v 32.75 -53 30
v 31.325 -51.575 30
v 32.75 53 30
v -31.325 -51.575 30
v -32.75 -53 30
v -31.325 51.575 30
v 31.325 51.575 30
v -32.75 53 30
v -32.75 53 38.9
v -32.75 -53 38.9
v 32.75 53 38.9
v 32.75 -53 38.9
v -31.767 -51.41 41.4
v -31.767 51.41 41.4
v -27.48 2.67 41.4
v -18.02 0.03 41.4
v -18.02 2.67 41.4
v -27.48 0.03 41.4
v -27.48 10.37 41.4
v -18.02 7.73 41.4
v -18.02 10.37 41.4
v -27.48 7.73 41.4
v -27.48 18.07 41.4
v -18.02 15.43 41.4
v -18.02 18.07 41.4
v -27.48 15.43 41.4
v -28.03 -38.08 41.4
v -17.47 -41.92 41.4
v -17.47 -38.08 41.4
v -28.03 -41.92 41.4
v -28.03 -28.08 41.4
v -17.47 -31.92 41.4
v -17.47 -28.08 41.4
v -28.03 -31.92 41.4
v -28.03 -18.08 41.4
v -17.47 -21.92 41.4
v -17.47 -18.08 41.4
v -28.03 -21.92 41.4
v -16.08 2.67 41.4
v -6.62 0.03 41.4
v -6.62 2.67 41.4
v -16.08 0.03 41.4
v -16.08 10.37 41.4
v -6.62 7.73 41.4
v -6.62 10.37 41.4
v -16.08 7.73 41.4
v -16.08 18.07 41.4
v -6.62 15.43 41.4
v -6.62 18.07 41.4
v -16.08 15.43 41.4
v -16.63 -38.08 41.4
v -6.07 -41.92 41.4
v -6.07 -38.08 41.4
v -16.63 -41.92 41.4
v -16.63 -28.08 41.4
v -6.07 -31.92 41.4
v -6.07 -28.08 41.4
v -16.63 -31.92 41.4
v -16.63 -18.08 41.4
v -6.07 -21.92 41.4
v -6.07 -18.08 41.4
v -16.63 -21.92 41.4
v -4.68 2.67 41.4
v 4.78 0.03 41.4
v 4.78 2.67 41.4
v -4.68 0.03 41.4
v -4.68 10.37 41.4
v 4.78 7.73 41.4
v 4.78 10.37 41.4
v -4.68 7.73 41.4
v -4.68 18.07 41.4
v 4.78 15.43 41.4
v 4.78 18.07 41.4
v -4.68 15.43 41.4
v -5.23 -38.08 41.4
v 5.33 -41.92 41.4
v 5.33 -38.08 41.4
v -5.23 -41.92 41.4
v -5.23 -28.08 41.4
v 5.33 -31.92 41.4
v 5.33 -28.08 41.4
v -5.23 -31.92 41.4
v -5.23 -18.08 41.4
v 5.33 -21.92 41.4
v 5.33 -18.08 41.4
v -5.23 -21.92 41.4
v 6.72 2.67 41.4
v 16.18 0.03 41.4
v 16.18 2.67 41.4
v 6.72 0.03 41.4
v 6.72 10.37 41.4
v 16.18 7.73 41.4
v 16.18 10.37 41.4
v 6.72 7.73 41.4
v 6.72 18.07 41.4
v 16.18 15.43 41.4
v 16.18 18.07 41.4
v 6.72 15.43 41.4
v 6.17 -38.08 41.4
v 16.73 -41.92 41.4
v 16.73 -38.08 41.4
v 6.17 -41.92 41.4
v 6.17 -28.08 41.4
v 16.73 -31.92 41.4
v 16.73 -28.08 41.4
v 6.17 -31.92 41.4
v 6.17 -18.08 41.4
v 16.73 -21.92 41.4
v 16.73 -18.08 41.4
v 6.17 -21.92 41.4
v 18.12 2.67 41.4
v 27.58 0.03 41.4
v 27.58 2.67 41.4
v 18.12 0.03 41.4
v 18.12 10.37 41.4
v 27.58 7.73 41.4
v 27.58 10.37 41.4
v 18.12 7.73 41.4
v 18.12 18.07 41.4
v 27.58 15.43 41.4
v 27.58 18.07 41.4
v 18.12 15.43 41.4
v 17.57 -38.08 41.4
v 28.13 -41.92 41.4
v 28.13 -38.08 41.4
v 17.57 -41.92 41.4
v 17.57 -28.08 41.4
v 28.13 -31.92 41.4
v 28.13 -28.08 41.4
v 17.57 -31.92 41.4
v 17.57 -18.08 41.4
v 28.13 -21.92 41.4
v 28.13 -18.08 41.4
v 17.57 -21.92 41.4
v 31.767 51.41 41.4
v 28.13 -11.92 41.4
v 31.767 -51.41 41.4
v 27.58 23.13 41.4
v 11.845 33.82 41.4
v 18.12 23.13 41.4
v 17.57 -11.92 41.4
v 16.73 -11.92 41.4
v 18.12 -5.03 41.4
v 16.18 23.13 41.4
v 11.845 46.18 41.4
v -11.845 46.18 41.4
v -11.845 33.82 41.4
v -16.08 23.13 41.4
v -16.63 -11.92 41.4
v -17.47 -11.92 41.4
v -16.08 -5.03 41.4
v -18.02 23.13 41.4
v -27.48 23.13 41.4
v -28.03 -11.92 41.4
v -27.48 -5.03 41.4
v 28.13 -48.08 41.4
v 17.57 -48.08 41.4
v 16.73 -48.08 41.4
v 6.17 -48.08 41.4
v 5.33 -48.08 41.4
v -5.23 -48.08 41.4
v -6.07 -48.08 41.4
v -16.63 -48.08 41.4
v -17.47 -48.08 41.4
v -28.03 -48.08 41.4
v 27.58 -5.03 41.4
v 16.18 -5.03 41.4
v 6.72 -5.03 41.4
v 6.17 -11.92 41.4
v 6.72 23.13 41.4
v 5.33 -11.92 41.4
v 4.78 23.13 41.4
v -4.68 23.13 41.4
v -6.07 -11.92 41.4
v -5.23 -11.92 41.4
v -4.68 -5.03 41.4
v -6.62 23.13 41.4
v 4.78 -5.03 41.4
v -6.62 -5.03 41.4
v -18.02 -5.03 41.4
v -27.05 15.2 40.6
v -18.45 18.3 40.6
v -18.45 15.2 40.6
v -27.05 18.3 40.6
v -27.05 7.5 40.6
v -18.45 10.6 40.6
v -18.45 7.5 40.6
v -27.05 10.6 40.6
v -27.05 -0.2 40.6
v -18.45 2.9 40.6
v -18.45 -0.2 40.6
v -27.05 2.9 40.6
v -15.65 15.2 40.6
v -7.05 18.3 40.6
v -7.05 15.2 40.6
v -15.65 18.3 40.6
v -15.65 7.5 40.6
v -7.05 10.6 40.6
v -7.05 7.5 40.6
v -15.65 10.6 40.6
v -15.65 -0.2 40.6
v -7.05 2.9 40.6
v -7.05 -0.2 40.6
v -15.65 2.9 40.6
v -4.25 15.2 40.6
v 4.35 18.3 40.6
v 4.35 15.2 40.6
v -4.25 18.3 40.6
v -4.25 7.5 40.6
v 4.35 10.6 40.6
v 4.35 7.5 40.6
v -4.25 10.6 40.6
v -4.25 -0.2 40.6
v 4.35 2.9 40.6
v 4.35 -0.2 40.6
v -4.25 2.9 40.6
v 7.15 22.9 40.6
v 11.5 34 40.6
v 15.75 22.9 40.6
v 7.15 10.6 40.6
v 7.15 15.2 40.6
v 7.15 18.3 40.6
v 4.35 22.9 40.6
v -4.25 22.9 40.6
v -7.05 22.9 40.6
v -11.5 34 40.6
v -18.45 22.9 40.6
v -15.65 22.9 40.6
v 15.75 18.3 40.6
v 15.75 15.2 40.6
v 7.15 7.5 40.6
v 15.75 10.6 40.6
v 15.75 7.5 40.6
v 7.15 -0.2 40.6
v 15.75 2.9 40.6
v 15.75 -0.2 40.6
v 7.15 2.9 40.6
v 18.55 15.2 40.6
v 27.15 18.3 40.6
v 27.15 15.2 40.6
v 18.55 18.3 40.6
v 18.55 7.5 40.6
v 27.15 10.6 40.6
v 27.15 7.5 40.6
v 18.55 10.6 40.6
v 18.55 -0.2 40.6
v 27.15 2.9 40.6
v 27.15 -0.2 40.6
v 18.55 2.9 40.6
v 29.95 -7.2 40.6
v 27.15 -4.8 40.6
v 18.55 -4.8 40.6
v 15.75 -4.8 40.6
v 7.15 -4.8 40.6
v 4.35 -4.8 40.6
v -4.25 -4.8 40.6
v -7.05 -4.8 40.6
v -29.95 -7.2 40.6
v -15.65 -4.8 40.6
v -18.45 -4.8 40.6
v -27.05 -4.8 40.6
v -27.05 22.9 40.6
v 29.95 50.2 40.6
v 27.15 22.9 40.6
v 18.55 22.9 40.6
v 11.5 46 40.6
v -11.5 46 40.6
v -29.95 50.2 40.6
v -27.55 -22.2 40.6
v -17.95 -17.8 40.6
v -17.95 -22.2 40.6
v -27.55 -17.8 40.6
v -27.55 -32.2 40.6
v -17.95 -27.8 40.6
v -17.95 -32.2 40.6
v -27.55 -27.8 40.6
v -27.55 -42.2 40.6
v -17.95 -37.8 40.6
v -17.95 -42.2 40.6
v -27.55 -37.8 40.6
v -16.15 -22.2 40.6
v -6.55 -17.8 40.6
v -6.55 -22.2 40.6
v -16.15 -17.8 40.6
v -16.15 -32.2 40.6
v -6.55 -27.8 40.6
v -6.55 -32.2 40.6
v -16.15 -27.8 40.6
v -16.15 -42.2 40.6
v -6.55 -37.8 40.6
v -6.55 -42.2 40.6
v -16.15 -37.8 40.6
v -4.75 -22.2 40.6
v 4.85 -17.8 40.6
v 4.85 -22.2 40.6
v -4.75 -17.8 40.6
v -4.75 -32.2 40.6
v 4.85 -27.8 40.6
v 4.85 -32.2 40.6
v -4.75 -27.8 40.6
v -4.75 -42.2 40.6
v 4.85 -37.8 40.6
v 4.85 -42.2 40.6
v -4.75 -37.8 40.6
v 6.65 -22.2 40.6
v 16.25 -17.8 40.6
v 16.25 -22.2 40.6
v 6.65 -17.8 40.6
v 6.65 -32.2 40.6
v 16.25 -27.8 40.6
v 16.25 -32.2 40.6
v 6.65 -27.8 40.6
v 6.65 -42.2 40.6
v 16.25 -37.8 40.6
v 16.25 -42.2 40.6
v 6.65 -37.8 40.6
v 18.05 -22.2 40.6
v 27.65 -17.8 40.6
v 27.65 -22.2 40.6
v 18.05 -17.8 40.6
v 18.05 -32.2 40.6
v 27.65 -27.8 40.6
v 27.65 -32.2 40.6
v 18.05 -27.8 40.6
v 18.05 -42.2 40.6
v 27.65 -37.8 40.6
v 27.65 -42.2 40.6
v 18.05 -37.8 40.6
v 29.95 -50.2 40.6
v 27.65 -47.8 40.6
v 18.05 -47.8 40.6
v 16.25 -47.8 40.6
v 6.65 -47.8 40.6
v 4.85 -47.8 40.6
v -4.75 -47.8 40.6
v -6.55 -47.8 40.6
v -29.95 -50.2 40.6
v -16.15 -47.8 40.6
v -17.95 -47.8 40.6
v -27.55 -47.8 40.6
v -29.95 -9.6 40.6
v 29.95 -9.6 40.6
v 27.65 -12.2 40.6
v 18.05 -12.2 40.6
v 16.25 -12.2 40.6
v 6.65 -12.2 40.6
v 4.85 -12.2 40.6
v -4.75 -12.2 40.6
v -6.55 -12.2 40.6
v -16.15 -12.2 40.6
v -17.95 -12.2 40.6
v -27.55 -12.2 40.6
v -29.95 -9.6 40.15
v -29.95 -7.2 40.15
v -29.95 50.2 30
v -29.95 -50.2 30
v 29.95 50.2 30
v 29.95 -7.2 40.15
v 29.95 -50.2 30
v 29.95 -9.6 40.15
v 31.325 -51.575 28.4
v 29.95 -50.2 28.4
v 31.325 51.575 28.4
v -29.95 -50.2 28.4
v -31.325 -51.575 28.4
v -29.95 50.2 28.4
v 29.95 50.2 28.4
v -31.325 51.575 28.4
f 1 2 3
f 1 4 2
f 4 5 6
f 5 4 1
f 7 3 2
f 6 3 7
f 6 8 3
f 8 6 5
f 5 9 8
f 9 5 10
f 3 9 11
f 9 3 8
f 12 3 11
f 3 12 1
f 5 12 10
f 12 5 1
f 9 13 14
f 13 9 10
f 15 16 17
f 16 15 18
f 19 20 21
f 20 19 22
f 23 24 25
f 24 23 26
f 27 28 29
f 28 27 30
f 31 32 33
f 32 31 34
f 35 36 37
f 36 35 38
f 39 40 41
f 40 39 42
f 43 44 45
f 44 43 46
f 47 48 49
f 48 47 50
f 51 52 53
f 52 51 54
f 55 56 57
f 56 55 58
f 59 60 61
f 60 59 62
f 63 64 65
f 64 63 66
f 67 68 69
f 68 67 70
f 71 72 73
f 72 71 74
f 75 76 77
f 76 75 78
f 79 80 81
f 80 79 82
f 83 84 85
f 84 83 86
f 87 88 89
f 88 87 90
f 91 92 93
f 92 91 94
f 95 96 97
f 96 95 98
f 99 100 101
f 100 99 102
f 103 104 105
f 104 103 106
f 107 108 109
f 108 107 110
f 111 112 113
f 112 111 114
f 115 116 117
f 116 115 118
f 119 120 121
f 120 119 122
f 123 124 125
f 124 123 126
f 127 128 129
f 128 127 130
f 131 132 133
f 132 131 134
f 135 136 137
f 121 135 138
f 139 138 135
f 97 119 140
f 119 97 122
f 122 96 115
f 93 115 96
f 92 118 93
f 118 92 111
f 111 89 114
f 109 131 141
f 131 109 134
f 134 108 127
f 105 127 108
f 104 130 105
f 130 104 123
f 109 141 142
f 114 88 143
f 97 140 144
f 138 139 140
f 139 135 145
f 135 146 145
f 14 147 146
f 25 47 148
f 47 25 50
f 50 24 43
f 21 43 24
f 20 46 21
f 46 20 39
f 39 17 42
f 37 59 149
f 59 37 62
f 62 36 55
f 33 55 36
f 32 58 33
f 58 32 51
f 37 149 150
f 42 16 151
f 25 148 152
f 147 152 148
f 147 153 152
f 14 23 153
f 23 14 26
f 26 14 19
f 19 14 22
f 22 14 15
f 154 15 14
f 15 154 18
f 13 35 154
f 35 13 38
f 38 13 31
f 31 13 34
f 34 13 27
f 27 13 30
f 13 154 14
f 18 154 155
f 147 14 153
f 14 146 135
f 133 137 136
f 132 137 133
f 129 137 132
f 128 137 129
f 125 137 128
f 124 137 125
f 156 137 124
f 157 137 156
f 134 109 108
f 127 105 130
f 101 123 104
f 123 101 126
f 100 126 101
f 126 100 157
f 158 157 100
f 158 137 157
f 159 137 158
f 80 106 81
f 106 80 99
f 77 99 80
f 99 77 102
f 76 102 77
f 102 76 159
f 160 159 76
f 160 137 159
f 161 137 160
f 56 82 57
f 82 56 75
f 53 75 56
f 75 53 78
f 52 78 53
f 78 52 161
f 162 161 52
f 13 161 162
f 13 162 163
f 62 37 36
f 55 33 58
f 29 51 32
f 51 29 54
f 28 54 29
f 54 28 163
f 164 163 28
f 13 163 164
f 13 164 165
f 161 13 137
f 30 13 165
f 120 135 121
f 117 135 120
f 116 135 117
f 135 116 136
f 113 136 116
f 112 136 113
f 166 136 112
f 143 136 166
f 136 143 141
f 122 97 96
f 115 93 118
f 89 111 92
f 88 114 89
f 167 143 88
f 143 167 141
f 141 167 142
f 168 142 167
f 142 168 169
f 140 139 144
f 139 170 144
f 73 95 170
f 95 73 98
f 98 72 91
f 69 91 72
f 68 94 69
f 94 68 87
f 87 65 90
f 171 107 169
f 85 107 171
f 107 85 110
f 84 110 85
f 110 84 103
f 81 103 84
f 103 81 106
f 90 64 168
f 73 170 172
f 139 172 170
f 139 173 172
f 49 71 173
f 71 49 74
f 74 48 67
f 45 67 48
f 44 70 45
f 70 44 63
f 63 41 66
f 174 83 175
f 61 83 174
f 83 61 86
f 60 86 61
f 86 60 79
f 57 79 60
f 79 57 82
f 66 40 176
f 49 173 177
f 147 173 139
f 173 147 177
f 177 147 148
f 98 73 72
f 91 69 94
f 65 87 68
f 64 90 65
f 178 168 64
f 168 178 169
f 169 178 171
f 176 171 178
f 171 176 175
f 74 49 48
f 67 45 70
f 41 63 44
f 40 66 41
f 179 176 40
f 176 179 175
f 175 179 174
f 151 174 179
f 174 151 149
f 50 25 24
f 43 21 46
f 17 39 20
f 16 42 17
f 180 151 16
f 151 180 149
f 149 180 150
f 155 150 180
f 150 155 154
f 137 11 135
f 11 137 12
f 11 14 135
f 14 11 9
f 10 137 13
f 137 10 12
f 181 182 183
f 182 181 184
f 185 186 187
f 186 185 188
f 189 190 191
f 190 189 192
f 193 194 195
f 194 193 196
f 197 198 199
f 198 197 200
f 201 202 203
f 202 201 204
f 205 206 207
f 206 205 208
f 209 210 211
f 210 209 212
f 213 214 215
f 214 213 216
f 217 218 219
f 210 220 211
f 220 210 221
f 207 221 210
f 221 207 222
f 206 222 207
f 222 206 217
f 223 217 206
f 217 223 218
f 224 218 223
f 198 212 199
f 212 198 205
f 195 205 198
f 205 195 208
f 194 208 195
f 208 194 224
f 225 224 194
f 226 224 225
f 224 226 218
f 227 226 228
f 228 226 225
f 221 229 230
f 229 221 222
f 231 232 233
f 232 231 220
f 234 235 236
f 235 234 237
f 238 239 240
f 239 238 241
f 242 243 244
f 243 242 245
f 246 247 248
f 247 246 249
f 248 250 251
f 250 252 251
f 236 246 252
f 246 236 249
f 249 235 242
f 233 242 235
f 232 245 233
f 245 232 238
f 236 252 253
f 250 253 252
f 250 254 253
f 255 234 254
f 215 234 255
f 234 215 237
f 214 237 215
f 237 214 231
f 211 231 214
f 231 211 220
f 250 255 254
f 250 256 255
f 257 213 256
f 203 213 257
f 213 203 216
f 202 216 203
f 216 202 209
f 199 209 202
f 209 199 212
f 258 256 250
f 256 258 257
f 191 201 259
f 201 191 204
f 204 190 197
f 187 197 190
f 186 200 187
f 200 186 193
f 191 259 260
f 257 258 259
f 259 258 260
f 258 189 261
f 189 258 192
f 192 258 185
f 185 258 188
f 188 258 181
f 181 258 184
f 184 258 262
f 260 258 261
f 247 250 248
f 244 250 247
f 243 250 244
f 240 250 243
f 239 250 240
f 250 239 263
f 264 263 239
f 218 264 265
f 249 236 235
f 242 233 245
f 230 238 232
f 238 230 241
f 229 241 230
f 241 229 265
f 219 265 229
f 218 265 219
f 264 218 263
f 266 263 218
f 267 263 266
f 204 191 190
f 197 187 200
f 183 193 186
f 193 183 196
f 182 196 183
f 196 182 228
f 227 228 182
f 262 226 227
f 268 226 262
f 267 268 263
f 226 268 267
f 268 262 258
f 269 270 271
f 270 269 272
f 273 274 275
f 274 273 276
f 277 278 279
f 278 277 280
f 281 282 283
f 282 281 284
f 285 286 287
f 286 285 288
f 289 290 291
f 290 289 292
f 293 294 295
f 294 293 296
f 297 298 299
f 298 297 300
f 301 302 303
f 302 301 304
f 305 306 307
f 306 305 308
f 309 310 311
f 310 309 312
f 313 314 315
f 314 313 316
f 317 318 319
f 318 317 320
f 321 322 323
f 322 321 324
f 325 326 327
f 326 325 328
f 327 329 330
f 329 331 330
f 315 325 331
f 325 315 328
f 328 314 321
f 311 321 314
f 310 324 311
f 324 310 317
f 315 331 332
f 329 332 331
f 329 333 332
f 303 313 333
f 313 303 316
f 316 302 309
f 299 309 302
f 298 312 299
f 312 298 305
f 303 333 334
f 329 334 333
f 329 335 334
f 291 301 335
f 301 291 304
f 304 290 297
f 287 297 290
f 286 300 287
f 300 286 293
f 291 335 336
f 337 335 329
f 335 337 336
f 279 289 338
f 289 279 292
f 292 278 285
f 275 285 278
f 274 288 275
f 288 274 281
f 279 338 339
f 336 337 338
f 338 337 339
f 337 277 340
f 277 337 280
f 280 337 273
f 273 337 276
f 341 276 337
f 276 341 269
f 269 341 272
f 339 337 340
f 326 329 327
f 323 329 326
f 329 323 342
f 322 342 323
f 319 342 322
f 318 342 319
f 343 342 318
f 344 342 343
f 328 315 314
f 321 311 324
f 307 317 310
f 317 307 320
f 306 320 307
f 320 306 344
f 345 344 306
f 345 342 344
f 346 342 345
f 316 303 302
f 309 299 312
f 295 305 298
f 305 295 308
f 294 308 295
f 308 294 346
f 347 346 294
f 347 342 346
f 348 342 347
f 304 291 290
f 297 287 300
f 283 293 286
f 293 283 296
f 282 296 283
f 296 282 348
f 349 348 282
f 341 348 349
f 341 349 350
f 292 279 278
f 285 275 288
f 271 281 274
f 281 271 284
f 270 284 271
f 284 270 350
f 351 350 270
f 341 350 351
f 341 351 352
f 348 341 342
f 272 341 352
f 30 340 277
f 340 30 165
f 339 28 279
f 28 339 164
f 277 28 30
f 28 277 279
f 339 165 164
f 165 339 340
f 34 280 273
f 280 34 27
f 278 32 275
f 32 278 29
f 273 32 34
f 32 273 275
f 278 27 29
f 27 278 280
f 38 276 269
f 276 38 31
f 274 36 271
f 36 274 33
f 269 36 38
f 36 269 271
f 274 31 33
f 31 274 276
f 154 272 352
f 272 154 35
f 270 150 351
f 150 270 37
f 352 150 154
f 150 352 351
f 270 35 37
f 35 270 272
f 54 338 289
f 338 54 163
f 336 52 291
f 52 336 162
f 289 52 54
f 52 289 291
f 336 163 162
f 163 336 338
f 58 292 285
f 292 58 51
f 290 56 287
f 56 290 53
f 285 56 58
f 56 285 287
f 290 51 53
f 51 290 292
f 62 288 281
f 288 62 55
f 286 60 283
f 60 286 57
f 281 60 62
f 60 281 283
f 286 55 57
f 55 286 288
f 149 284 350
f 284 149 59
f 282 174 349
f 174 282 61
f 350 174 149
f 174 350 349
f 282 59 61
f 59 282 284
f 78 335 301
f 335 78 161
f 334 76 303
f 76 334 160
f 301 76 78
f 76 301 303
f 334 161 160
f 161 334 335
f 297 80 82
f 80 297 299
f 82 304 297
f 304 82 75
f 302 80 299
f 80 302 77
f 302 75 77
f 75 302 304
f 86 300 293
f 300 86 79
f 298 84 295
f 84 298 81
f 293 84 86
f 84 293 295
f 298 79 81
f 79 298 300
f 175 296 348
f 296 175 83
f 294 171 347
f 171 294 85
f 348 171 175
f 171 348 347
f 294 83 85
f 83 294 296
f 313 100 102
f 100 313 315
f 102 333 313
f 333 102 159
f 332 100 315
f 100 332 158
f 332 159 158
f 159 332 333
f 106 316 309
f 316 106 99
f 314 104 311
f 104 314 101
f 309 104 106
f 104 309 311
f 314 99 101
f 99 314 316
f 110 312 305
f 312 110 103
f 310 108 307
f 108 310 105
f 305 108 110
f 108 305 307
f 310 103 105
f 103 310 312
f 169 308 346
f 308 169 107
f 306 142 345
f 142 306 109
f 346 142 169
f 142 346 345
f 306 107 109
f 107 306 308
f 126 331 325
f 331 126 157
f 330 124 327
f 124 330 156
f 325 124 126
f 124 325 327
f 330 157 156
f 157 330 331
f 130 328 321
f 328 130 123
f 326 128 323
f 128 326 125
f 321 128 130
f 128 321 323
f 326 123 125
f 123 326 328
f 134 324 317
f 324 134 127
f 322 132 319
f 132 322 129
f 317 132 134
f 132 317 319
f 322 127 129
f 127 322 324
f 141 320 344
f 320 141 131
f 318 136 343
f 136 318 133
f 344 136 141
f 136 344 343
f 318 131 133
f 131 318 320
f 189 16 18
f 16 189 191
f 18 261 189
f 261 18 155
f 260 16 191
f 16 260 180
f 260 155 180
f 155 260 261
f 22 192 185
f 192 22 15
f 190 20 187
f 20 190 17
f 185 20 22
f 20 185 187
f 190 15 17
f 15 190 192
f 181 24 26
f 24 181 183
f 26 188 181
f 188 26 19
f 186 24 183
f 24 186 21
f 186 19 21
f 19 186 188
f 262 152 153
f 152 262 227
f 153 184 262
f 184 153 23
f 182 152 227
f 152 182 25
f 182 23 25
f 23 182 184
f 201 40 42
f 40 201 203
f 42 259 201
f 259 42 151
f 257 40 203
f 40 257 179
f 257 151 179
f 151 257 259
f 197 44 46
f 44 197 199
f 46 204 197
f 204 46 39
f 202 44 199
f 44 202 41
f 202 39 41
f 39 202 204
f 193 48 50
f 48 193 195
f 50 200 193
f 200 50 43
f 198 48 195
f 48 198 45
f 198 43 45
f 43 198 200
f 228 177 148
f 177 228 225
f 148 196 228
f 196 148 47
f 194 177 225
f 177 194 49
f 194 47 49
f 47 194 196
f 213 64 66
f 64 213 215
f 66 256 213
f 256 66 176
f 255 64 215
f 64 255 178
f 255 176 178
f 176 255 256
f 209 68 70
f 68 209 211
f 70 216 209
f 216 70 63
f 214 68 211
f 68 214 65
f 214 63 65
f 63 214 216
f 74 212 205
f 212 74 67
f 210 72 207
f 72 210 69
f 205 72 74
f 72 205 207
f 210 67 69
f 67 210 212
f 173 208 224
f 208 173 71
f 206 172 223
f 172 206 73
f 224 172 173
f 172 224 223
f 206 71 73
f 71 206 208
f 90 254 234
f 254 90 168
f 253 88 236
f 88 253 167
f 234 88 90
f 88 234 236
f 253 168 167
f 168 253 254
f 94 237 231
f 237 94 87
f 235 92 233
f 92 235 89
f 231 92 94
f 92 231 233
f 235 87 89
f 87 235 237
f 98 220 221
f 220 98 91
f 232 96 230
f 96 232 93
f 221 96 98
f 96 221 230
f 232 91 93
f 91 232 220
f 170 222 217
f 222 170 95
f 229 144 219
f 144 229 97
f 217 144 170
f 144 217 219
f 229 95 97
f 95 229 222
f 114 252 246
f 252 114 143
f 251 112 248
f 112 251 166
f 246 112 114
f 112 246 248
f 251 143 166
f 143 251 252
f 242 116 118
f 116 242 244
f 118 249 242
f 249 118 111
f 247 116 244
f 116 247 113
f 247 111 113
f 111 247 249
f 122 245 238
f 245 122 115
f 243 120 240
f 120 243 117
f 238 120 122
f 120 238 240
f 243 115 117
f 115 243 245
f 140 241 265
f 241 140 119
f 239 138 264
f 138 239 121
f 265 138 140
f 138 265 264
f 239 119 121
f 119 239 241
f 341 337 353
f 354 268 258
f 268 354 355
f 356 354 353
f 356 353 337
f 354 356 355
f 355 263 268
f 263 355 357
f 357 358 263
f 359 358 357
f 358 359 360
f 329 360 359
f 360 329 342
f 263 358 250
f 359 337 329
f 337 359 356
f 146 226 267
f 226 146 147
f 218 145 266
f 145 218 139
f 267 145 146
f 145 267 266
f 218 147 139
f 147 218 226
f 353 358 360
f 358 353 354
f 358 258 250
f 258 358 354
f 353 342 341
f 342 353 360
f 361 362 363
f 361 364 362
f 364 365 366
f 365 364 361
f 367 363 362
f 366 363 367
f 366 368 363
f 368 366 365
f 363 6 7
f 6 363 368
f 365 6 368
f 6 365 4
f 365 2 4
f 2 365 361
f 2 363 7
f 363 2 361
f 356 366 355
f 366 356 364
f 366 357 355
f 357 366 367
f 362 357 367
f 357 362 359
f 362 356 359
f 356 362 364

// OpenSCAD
// Thickness values for the case elements
pcb_thickness = 7;       // PCB thickness
lcd_thickness = 2.6;       // LCD thickness needed for border around screen
battery_thickness = 5.5;   // Tallest element on the back of the PCB is battery holder

// Thickness values for elements of keyboard spacer
switch_thickness = 2.0; 
pusher_thickness = 0.6;       
spacer_spring_thickness = 0.2;

// Thickness values for elements of keypad
keypad_thickness = 0.6; 
keypad_spring_thickness = 0.4; // Optionally can make flat spring thinner than keypad
keypad_tolerance = 0.4;        // Gap between keypad and case top

face_thickness = 0.8; 
back_thickness = 0.8; 
chamfer_thickness = 2.5; 
wall_width = 3.0; 
joint_thickness = 1.6; 
joint_width = 1.4; 
joint_tolerance = 0.05; 

pcb_width = 59.5; 
pcb_height = 100;
pcb_tolerance = 0.2; 

keypad_large_row = 5; // Distance from bottom PCB edge to the  
                        // center of 1st (bottom) row of large keys
keypad_small_row = 47.5; // Distance from bottom PCB edge to the  
                        // center of 1st (bottom) row of small keys

// Derived dimensions
spacer_thickness = switch_thickness + pusher_thickness; 
keyboard_thickness = spacer_thickness + keypad_thickness + keypad_tolerance; 

top_thickness = pcb_thickness + keyboard_thickness + face_thickness; 
bottom_thickness = battery_thickness + back_thickness; 
tot_thickness = top_thickness + bottom_thickness; 
tot_width = pcb_width + 2*wall_width; 
tot_height = pcb_height + 2*wall_width; 

keyb_left = 5.75; //keyboard left

module top_half() {
    difference() {
        union() {
            linear_extrude(height = top_thickness-chamfer_thickness) {
                square([tot_width, tot_height], center = true); 
            }
            translate([0, 0, top_thickness-chamfer_thickness]) {
                linear_extrude(height = chamfer_thickness, scale = 0.97) {
                    square([tot_width, tot_height], center = true); 
                }
            }
        }

        linear_extrude(height = pcb_thickness + keyboard_thickness) {
            square([pcb_width + 2*pcb_tolerance, pcb_height + 2*pcb_tolerance], 
                       center = true); 
        }

        // Cut-outs for large keys
        union() { 
            for (i=[0:4]) {
                for (j=[0:3]) {
                   translate([11.4*(i-2.5)+keyb_left, 10*j-pcb_height/2.+keypad_large_row, 
                              pcb_thickness + keyboard_thickness]) 
//                        cube([9.6, 5.6, 10], center = true); 
                        linear_extrude(height = face_thickness, scale = 1.1) 
                            square([9.6, 5.6], center = true); 

                }
            }
        }

        // Cut-outs for small keys
        union() { 
            for (i=[0:4]) {
                for (j=[0:3]) {
                   translate([11.4*(i-2.5)+keyb_left, 
                        7.7*j-pcb_height/2.+keypad_small_row, 
                        pcb_thickness + keyboard_thickness]) 
//                        cube([8.6, 4.6, 10], center = true); 
                        linear_extrude(height = face_thickness, scale = 1.1) 
                            square([8.6, 4.6], center = true); 

                }
            }
        }
        
        // Cut-out for display
        translate([0, pcb_height/2.-20/2., pcb_thickness + keyboard_thickness]) 
          linear_extrude(height = face_thickness, scale = 1.03) 
            square([23, 12], center = true); 
        
        
//katse eksituse meetodil leitud auk programmeerimiskaabli jaoks:       
//       translate([-pcb_width/2.-13, 32, pcb_thickness/6.]) 
//            cube([13, 16, pcb_thickness*2], center = false);  
        
    }

    // Supporting edge between display and keyboard (vahejoon)
    translate([0, pcb_height/2.-58.4, pcb_thickness + keyboard_thickness]) 
      cube([pcb_width+2*pcb_tolerance, 2.4, keyboard_thickness/4], 
           center = true);     

    // Joint around PCB
    translate([0, 0, -joint_thickness]) 
    difference() {
      linear_extrude(height = joint_thickness) {
        difference() {
            square([pcb_width + 2*pcb_tolerance+2*joint_width-joint_tolerance, 
                    pcb_height + 2*pcb_tolerance + 2*joint_width-joint_tolerance], center = true); 
            square([pcb_width + 2*pcb_tolerance, 
                    pcb_height + 2*pcb_tolerance], center = true); 
        }
      }
      // Cut-out for display cable
//      translate([0, pcb_height/2., pcb_thickness/2.]) 
//                  cube([12, 2, pcb_thickness*2], center = true); 
    }
}; 
    
module bottom_half() {
    difference() {
        union() {
            linear_extrude(height = bottom_thickness - chamfer_thickness) {
                square([tot_width, tot_height], center = true); 
            }
            translate([0, 0, bottom_thickness - chamfer_thickness]) {
                linear_extrude(height = chamfer_thickness, scale = 0.97) {
                    square([tot_width, tot_height], center = true); 
                }
            }
        }
        linear_extrude(height = battery_thickness) {
                square([pcb_width+2*pcb_tolerance, pcb_height+2*pcb_tolerance], 
                   center = true); 
        }

      // Joint around PCB
      translate([0, 0, 0]) 
        linear_extrude(height = joint_thickness) {
          difference() {
            square([pcb_width + 2*pcb_tolerance+2*joint_width + joint_tolerance, 
                    pcb_height + 2*pcb_tolerance + 2*joint_width + joint_tolerance], center = true); 
            square([pcb_width + 2*pcb_tolerance, 
                    pcb_height + 2*pcb_tolerance], center = true); 
          }
        }

    translate([-pcb_width/3, pcb_height/2. + pcb_tolerance + joint_width-0.2 + joint_tolerance, joint_thickness-0.4]) rotate(a = [0, 90, 0]) cylinder(17, r=0.4, $fn=16, center = true); 
    translate([+pcb_width/3, pcb_height/2. + pcb_tolerance + joint_width-0.2 + joint_tolerance, joint_thickness-0.4]) rotate(a = [0, 90, 0]) cylinder(17, r=0.4, $fn=16, center = true); 
    translate([-pcb_width/3, -pcb_height/2. - pcb_tolerance - joint_width+0.2 - joint_tolerance, joint_thickness-0.4]) rotate(a = [0, 90, 0]) cylinder(17, r=0.4, $fn=16, center = true); 
    translate([+pcb_width/3, -pcb_height/2. - pcb_tolerance - joint_width+0.2 - joint_tolerance, joint_thickness-0.4]) rotate(a = [0, 90, 0]) cylinder(17, r=0.4, $fn=16, center = true); 
    translate([-pcb_width/2 - pcb_tolerance - joint_width+0.2- joint_tolerance, pcb_height/3., joint_thickness-0.4]) rotate(a = [90, 0, 0]) cylinder(17, r=0.4, $fn=16, center = true); 
    translate([-pcb_width/2 - pcb_tolerance - joint_width+0.2- joint_tolerance, -pcb_height/3., joint_thickness-0.4]) rotate(a = [90, 0, 0]) cylinder(17, r=0.4, $fn=16, center = true); 
    translate([ pcb_width/2 + pcb_tolerance + joint_width-0.2+joint_tolerance, pcb_height/3., joint_thickness-0.4]) rotate(a = [90, 0, 0]) cylinder(17, r=0.4, $fn=16, center = true); 
    translate([ pcb_width/2 + pcb_tolerance + joint_width-0.2+joint_tolerance, -pcb_height/3., joint_thickness-0.4]) rotate(a = [90, 0, 0]) cylinder(17, r=0.4, $fn=16, center = true); 
    translate([-pcb_width/2 - pcb_tolerance - joint_width+0.2-joint_tolerance, 0, joint_thickness-0.4]) rotate(a = [90, 0, 0]) cylinder(17, r=0.4, $fn=16, center = true); 
    translate([ pcb_width/2 + pcb_tolerance + joint_width-0.2+joint_tolerance, 0, joint_thickness-0.4]) rotate(a = [90, 0, 0]) cylinder(17, r=0.4, $fn=16, center = true); 


    }
    
//    for (i=[0:3]) {
//      translate([0, 10-i*65/3., battery_thickness/2.]) cube([pcb_width, 3, battery_thickness], center = true);
//    }
    
//    translate([-pcb_width/2.+3/2., pcb_height/4., battery_thickness/2.]) cube([3, pcb_height/3., battery_thickness], center = true);
}; 

module large_key(s) {
  translate([0, 0, keypad_thickness/2]) {
    difference() {
      cube([12, 11, keypad_thickness], center = true); 
      cube([11.2,  8, keypad_thickness ], center = true); 
    }
  }; 
  translate([-2.5, -4, 0]) cube([5, 1, keypad_spring_thickness]); 
  translate([0, 0, keypad_thickness/2.]) cube([10,  6, keypad_thickness ], center = true); 
  difference() {
    linear_extrude(height = 2.2, scale = 0.85) square([9.2, 5.2], center = true); 
    //translate([0, 0, 3/2.]) cube([9, 5, 3 ], center = true); 
    translate([0, 0, 2.4]) {
        linear_extrude(height = 0.8) {
            text(s, font = "Liberation Sans:style=Bold", size = 3, halign = "center"        , valign = "center");
        }
    }
  }
}

module small_key(s) {
  translate([0, 0, 0.6/2]) {
    difference() {
      cube([12, 8.6, 0.6], center = true); 
      cube([10,  7.0, 1. ], center = true); 
    }
  }; 
  translate([-2., -3.5, 0]) cube([4, 1, 0.4]); 
  translate([0, 0, 0.6/2.]) cube([9., 5.5, 0.6 ], center = true); 
  difference() {
    linear_extrude(height = 2.2, scale = 0.9) square([8.2, 4.2], 
      center = true); 
    //translate([0, 0, 3/2.]) cube([9, 5, 3 ], center = true); 
    translate([0, 0, 2.2]) {
        linear_extrude(height = 0.8) {
            text(s, font = "Liberation Sans:style=Bold", size = 2.4, halign = "center"        , valign = "center");
        }
    }
  }
}

module large_keypad() {

  labels = [
  "0", "/-/", ".", "+/-", "Ent", 
  "1", "2", "3", "+", "-", 
  "4", "5", "6", "*", "/", 
  "7", "8", "9", "E", "C"
  ]; 

  for (i=[0:4]) {
    for (j=[0:3]) {
      translate([11.4*(i-2), 10*j-pcb_height/2.+keypad_large_row, 
              pcb_thickness + spacer_thickness]) 
//        large_key(labels[5*j+i]); 
        large_key(""); 
    }
  }

}


module small_keypad() {

  labels = [
  "Erf", "Sqrt", "Pol", "1/x", "Drp", "X-Y", 
  "y^x", "ln", "lg", "sin", "cos", "tan", 
  "", "", "R-G", "M+", "MR", "MS", 
  "F", "G", "Mod", "Unc", "Prc", "On"
  ]; 

  for (i=[0:4]) {
    for (j=[0:3]) {
      translate([11.4*(i-2.5)+keyb_left, 7.7*j-pcb_height/2.+keypad_small_row, 
               pcb_thickness + spacer_thickness]) 
//        small_key(labels[6*j+i]); 
        small_key(""); 
    }
  }
  
  // Additional width on left and right
//  translate([pcb_width/2.-0.5, -8.6/2.-pcb_height/2.+keypad_small_row, 
//               pcb_thickness + spacer_thickness]) 
//    cube([0.5, 7.7*4 + 8.6-7.7, 0.6]); 
//  
//  translate([-pcb_width/2., -8.6/2.-pcb_height/2.+keypad_small_row, 
//               pcb_thickness + spacer_thickness]) 
//    cube([0.5, 7.7*4 + 8.6-7.7, 0.6]); 
  
}

module keypad() {

  large_keypad(); 
  small_keypad(); 

  // Connection between two keypads
//  translate([0., 10*4-pcb_height/2.+4.6, pcb_thickness + spacer_thickness + 0.6/2.]) cube([pcb_width, 2.2, 0.6], center = true); 
}

module large_spacer_element() {
  
    difference() {
      cube([14, 10, spacer_thickness], center = true); 
      cube([11, 7, spacer_thickness], center = true); 
    }
    translate([0, 0, spacer_thickness/2-pusher_thickness/2]) 
//      cube([3.2, 2.6, pusher_thickness], center = true); 
      cylinder(pusher_thickness, r = 1.6, center = true, $fn = 16);
    translate([0, -2.5, spacer_thickness/2-spacer_spring_thickness/2])  
      cube([3.0, 5, spacer_spring_thickness], center = true); 
}

module small_spacer_element() {
  
    difference() {
      cube([13, 8.6, spacer_thickness], center = true); 
      cube([10, 6.5, spacer_thickness], center = true); 
    }
    translate([0, 0, spacer_thickness/2-pusher_thickness/2]) 
//      cube([3.2, 2.6, pusher_thickness], center = true); 
      cylinder(pusher_thickness, r = 1.6, center = true, $fn = 16);
    translate([0, -8.6/4., spacer_thickness/2-spacer_spring_thickness/2])  
      cube([3.0, 8.6/2., spacer_spring_thickness], center = true); 
}

module spacer() {

//large
  for (i=[0:4]) {
    for (j=[0:3]) {
      translate([11.4*(i-2.5)+keyb_left, 10*j-pcb_height/2.+keypad_large_row, 
              pcb_thickness + spacer_thickness/2.]) 
        large_spacer_element(); 
    }
  }

//small
  for (i=[0:4]) {
    for (j=[0:3]) {
      translate([11.4*(i-2.5)+keyb_left, 7.7*j-pcb_height/2.+keypad_small_row, 
               pcb_thickness + spacer_thickness/2.]) 
        small_spacer_element(); 
    }
  }

//  translate([0, -18.9, pcb_thickness + spacer_thickness/2.]) 
//    cube([pcb_width, 2.2, spacer_thickness], center = true); 
}


// Tests 
//translate([0., 5.,  spacer_thickness/2.]) mirror([0,0,1]) small_spacer_element(); 
//translate([0., -5., 0]) small_key("y^x"); 



// Finally, make all parts
// Comment out if needed

//translate([0., 0., 0]) spacer(); 

//translate([0., 0., 10]) keypad();   

translate([0., 0., 30]) top_half(); 

//translate([0., 0., -10]) mirror([0,0,1]) bottom_half(); 

//cube([1, 1, 1], center = true); // Dummy cube for "mouse ears" in slicer
